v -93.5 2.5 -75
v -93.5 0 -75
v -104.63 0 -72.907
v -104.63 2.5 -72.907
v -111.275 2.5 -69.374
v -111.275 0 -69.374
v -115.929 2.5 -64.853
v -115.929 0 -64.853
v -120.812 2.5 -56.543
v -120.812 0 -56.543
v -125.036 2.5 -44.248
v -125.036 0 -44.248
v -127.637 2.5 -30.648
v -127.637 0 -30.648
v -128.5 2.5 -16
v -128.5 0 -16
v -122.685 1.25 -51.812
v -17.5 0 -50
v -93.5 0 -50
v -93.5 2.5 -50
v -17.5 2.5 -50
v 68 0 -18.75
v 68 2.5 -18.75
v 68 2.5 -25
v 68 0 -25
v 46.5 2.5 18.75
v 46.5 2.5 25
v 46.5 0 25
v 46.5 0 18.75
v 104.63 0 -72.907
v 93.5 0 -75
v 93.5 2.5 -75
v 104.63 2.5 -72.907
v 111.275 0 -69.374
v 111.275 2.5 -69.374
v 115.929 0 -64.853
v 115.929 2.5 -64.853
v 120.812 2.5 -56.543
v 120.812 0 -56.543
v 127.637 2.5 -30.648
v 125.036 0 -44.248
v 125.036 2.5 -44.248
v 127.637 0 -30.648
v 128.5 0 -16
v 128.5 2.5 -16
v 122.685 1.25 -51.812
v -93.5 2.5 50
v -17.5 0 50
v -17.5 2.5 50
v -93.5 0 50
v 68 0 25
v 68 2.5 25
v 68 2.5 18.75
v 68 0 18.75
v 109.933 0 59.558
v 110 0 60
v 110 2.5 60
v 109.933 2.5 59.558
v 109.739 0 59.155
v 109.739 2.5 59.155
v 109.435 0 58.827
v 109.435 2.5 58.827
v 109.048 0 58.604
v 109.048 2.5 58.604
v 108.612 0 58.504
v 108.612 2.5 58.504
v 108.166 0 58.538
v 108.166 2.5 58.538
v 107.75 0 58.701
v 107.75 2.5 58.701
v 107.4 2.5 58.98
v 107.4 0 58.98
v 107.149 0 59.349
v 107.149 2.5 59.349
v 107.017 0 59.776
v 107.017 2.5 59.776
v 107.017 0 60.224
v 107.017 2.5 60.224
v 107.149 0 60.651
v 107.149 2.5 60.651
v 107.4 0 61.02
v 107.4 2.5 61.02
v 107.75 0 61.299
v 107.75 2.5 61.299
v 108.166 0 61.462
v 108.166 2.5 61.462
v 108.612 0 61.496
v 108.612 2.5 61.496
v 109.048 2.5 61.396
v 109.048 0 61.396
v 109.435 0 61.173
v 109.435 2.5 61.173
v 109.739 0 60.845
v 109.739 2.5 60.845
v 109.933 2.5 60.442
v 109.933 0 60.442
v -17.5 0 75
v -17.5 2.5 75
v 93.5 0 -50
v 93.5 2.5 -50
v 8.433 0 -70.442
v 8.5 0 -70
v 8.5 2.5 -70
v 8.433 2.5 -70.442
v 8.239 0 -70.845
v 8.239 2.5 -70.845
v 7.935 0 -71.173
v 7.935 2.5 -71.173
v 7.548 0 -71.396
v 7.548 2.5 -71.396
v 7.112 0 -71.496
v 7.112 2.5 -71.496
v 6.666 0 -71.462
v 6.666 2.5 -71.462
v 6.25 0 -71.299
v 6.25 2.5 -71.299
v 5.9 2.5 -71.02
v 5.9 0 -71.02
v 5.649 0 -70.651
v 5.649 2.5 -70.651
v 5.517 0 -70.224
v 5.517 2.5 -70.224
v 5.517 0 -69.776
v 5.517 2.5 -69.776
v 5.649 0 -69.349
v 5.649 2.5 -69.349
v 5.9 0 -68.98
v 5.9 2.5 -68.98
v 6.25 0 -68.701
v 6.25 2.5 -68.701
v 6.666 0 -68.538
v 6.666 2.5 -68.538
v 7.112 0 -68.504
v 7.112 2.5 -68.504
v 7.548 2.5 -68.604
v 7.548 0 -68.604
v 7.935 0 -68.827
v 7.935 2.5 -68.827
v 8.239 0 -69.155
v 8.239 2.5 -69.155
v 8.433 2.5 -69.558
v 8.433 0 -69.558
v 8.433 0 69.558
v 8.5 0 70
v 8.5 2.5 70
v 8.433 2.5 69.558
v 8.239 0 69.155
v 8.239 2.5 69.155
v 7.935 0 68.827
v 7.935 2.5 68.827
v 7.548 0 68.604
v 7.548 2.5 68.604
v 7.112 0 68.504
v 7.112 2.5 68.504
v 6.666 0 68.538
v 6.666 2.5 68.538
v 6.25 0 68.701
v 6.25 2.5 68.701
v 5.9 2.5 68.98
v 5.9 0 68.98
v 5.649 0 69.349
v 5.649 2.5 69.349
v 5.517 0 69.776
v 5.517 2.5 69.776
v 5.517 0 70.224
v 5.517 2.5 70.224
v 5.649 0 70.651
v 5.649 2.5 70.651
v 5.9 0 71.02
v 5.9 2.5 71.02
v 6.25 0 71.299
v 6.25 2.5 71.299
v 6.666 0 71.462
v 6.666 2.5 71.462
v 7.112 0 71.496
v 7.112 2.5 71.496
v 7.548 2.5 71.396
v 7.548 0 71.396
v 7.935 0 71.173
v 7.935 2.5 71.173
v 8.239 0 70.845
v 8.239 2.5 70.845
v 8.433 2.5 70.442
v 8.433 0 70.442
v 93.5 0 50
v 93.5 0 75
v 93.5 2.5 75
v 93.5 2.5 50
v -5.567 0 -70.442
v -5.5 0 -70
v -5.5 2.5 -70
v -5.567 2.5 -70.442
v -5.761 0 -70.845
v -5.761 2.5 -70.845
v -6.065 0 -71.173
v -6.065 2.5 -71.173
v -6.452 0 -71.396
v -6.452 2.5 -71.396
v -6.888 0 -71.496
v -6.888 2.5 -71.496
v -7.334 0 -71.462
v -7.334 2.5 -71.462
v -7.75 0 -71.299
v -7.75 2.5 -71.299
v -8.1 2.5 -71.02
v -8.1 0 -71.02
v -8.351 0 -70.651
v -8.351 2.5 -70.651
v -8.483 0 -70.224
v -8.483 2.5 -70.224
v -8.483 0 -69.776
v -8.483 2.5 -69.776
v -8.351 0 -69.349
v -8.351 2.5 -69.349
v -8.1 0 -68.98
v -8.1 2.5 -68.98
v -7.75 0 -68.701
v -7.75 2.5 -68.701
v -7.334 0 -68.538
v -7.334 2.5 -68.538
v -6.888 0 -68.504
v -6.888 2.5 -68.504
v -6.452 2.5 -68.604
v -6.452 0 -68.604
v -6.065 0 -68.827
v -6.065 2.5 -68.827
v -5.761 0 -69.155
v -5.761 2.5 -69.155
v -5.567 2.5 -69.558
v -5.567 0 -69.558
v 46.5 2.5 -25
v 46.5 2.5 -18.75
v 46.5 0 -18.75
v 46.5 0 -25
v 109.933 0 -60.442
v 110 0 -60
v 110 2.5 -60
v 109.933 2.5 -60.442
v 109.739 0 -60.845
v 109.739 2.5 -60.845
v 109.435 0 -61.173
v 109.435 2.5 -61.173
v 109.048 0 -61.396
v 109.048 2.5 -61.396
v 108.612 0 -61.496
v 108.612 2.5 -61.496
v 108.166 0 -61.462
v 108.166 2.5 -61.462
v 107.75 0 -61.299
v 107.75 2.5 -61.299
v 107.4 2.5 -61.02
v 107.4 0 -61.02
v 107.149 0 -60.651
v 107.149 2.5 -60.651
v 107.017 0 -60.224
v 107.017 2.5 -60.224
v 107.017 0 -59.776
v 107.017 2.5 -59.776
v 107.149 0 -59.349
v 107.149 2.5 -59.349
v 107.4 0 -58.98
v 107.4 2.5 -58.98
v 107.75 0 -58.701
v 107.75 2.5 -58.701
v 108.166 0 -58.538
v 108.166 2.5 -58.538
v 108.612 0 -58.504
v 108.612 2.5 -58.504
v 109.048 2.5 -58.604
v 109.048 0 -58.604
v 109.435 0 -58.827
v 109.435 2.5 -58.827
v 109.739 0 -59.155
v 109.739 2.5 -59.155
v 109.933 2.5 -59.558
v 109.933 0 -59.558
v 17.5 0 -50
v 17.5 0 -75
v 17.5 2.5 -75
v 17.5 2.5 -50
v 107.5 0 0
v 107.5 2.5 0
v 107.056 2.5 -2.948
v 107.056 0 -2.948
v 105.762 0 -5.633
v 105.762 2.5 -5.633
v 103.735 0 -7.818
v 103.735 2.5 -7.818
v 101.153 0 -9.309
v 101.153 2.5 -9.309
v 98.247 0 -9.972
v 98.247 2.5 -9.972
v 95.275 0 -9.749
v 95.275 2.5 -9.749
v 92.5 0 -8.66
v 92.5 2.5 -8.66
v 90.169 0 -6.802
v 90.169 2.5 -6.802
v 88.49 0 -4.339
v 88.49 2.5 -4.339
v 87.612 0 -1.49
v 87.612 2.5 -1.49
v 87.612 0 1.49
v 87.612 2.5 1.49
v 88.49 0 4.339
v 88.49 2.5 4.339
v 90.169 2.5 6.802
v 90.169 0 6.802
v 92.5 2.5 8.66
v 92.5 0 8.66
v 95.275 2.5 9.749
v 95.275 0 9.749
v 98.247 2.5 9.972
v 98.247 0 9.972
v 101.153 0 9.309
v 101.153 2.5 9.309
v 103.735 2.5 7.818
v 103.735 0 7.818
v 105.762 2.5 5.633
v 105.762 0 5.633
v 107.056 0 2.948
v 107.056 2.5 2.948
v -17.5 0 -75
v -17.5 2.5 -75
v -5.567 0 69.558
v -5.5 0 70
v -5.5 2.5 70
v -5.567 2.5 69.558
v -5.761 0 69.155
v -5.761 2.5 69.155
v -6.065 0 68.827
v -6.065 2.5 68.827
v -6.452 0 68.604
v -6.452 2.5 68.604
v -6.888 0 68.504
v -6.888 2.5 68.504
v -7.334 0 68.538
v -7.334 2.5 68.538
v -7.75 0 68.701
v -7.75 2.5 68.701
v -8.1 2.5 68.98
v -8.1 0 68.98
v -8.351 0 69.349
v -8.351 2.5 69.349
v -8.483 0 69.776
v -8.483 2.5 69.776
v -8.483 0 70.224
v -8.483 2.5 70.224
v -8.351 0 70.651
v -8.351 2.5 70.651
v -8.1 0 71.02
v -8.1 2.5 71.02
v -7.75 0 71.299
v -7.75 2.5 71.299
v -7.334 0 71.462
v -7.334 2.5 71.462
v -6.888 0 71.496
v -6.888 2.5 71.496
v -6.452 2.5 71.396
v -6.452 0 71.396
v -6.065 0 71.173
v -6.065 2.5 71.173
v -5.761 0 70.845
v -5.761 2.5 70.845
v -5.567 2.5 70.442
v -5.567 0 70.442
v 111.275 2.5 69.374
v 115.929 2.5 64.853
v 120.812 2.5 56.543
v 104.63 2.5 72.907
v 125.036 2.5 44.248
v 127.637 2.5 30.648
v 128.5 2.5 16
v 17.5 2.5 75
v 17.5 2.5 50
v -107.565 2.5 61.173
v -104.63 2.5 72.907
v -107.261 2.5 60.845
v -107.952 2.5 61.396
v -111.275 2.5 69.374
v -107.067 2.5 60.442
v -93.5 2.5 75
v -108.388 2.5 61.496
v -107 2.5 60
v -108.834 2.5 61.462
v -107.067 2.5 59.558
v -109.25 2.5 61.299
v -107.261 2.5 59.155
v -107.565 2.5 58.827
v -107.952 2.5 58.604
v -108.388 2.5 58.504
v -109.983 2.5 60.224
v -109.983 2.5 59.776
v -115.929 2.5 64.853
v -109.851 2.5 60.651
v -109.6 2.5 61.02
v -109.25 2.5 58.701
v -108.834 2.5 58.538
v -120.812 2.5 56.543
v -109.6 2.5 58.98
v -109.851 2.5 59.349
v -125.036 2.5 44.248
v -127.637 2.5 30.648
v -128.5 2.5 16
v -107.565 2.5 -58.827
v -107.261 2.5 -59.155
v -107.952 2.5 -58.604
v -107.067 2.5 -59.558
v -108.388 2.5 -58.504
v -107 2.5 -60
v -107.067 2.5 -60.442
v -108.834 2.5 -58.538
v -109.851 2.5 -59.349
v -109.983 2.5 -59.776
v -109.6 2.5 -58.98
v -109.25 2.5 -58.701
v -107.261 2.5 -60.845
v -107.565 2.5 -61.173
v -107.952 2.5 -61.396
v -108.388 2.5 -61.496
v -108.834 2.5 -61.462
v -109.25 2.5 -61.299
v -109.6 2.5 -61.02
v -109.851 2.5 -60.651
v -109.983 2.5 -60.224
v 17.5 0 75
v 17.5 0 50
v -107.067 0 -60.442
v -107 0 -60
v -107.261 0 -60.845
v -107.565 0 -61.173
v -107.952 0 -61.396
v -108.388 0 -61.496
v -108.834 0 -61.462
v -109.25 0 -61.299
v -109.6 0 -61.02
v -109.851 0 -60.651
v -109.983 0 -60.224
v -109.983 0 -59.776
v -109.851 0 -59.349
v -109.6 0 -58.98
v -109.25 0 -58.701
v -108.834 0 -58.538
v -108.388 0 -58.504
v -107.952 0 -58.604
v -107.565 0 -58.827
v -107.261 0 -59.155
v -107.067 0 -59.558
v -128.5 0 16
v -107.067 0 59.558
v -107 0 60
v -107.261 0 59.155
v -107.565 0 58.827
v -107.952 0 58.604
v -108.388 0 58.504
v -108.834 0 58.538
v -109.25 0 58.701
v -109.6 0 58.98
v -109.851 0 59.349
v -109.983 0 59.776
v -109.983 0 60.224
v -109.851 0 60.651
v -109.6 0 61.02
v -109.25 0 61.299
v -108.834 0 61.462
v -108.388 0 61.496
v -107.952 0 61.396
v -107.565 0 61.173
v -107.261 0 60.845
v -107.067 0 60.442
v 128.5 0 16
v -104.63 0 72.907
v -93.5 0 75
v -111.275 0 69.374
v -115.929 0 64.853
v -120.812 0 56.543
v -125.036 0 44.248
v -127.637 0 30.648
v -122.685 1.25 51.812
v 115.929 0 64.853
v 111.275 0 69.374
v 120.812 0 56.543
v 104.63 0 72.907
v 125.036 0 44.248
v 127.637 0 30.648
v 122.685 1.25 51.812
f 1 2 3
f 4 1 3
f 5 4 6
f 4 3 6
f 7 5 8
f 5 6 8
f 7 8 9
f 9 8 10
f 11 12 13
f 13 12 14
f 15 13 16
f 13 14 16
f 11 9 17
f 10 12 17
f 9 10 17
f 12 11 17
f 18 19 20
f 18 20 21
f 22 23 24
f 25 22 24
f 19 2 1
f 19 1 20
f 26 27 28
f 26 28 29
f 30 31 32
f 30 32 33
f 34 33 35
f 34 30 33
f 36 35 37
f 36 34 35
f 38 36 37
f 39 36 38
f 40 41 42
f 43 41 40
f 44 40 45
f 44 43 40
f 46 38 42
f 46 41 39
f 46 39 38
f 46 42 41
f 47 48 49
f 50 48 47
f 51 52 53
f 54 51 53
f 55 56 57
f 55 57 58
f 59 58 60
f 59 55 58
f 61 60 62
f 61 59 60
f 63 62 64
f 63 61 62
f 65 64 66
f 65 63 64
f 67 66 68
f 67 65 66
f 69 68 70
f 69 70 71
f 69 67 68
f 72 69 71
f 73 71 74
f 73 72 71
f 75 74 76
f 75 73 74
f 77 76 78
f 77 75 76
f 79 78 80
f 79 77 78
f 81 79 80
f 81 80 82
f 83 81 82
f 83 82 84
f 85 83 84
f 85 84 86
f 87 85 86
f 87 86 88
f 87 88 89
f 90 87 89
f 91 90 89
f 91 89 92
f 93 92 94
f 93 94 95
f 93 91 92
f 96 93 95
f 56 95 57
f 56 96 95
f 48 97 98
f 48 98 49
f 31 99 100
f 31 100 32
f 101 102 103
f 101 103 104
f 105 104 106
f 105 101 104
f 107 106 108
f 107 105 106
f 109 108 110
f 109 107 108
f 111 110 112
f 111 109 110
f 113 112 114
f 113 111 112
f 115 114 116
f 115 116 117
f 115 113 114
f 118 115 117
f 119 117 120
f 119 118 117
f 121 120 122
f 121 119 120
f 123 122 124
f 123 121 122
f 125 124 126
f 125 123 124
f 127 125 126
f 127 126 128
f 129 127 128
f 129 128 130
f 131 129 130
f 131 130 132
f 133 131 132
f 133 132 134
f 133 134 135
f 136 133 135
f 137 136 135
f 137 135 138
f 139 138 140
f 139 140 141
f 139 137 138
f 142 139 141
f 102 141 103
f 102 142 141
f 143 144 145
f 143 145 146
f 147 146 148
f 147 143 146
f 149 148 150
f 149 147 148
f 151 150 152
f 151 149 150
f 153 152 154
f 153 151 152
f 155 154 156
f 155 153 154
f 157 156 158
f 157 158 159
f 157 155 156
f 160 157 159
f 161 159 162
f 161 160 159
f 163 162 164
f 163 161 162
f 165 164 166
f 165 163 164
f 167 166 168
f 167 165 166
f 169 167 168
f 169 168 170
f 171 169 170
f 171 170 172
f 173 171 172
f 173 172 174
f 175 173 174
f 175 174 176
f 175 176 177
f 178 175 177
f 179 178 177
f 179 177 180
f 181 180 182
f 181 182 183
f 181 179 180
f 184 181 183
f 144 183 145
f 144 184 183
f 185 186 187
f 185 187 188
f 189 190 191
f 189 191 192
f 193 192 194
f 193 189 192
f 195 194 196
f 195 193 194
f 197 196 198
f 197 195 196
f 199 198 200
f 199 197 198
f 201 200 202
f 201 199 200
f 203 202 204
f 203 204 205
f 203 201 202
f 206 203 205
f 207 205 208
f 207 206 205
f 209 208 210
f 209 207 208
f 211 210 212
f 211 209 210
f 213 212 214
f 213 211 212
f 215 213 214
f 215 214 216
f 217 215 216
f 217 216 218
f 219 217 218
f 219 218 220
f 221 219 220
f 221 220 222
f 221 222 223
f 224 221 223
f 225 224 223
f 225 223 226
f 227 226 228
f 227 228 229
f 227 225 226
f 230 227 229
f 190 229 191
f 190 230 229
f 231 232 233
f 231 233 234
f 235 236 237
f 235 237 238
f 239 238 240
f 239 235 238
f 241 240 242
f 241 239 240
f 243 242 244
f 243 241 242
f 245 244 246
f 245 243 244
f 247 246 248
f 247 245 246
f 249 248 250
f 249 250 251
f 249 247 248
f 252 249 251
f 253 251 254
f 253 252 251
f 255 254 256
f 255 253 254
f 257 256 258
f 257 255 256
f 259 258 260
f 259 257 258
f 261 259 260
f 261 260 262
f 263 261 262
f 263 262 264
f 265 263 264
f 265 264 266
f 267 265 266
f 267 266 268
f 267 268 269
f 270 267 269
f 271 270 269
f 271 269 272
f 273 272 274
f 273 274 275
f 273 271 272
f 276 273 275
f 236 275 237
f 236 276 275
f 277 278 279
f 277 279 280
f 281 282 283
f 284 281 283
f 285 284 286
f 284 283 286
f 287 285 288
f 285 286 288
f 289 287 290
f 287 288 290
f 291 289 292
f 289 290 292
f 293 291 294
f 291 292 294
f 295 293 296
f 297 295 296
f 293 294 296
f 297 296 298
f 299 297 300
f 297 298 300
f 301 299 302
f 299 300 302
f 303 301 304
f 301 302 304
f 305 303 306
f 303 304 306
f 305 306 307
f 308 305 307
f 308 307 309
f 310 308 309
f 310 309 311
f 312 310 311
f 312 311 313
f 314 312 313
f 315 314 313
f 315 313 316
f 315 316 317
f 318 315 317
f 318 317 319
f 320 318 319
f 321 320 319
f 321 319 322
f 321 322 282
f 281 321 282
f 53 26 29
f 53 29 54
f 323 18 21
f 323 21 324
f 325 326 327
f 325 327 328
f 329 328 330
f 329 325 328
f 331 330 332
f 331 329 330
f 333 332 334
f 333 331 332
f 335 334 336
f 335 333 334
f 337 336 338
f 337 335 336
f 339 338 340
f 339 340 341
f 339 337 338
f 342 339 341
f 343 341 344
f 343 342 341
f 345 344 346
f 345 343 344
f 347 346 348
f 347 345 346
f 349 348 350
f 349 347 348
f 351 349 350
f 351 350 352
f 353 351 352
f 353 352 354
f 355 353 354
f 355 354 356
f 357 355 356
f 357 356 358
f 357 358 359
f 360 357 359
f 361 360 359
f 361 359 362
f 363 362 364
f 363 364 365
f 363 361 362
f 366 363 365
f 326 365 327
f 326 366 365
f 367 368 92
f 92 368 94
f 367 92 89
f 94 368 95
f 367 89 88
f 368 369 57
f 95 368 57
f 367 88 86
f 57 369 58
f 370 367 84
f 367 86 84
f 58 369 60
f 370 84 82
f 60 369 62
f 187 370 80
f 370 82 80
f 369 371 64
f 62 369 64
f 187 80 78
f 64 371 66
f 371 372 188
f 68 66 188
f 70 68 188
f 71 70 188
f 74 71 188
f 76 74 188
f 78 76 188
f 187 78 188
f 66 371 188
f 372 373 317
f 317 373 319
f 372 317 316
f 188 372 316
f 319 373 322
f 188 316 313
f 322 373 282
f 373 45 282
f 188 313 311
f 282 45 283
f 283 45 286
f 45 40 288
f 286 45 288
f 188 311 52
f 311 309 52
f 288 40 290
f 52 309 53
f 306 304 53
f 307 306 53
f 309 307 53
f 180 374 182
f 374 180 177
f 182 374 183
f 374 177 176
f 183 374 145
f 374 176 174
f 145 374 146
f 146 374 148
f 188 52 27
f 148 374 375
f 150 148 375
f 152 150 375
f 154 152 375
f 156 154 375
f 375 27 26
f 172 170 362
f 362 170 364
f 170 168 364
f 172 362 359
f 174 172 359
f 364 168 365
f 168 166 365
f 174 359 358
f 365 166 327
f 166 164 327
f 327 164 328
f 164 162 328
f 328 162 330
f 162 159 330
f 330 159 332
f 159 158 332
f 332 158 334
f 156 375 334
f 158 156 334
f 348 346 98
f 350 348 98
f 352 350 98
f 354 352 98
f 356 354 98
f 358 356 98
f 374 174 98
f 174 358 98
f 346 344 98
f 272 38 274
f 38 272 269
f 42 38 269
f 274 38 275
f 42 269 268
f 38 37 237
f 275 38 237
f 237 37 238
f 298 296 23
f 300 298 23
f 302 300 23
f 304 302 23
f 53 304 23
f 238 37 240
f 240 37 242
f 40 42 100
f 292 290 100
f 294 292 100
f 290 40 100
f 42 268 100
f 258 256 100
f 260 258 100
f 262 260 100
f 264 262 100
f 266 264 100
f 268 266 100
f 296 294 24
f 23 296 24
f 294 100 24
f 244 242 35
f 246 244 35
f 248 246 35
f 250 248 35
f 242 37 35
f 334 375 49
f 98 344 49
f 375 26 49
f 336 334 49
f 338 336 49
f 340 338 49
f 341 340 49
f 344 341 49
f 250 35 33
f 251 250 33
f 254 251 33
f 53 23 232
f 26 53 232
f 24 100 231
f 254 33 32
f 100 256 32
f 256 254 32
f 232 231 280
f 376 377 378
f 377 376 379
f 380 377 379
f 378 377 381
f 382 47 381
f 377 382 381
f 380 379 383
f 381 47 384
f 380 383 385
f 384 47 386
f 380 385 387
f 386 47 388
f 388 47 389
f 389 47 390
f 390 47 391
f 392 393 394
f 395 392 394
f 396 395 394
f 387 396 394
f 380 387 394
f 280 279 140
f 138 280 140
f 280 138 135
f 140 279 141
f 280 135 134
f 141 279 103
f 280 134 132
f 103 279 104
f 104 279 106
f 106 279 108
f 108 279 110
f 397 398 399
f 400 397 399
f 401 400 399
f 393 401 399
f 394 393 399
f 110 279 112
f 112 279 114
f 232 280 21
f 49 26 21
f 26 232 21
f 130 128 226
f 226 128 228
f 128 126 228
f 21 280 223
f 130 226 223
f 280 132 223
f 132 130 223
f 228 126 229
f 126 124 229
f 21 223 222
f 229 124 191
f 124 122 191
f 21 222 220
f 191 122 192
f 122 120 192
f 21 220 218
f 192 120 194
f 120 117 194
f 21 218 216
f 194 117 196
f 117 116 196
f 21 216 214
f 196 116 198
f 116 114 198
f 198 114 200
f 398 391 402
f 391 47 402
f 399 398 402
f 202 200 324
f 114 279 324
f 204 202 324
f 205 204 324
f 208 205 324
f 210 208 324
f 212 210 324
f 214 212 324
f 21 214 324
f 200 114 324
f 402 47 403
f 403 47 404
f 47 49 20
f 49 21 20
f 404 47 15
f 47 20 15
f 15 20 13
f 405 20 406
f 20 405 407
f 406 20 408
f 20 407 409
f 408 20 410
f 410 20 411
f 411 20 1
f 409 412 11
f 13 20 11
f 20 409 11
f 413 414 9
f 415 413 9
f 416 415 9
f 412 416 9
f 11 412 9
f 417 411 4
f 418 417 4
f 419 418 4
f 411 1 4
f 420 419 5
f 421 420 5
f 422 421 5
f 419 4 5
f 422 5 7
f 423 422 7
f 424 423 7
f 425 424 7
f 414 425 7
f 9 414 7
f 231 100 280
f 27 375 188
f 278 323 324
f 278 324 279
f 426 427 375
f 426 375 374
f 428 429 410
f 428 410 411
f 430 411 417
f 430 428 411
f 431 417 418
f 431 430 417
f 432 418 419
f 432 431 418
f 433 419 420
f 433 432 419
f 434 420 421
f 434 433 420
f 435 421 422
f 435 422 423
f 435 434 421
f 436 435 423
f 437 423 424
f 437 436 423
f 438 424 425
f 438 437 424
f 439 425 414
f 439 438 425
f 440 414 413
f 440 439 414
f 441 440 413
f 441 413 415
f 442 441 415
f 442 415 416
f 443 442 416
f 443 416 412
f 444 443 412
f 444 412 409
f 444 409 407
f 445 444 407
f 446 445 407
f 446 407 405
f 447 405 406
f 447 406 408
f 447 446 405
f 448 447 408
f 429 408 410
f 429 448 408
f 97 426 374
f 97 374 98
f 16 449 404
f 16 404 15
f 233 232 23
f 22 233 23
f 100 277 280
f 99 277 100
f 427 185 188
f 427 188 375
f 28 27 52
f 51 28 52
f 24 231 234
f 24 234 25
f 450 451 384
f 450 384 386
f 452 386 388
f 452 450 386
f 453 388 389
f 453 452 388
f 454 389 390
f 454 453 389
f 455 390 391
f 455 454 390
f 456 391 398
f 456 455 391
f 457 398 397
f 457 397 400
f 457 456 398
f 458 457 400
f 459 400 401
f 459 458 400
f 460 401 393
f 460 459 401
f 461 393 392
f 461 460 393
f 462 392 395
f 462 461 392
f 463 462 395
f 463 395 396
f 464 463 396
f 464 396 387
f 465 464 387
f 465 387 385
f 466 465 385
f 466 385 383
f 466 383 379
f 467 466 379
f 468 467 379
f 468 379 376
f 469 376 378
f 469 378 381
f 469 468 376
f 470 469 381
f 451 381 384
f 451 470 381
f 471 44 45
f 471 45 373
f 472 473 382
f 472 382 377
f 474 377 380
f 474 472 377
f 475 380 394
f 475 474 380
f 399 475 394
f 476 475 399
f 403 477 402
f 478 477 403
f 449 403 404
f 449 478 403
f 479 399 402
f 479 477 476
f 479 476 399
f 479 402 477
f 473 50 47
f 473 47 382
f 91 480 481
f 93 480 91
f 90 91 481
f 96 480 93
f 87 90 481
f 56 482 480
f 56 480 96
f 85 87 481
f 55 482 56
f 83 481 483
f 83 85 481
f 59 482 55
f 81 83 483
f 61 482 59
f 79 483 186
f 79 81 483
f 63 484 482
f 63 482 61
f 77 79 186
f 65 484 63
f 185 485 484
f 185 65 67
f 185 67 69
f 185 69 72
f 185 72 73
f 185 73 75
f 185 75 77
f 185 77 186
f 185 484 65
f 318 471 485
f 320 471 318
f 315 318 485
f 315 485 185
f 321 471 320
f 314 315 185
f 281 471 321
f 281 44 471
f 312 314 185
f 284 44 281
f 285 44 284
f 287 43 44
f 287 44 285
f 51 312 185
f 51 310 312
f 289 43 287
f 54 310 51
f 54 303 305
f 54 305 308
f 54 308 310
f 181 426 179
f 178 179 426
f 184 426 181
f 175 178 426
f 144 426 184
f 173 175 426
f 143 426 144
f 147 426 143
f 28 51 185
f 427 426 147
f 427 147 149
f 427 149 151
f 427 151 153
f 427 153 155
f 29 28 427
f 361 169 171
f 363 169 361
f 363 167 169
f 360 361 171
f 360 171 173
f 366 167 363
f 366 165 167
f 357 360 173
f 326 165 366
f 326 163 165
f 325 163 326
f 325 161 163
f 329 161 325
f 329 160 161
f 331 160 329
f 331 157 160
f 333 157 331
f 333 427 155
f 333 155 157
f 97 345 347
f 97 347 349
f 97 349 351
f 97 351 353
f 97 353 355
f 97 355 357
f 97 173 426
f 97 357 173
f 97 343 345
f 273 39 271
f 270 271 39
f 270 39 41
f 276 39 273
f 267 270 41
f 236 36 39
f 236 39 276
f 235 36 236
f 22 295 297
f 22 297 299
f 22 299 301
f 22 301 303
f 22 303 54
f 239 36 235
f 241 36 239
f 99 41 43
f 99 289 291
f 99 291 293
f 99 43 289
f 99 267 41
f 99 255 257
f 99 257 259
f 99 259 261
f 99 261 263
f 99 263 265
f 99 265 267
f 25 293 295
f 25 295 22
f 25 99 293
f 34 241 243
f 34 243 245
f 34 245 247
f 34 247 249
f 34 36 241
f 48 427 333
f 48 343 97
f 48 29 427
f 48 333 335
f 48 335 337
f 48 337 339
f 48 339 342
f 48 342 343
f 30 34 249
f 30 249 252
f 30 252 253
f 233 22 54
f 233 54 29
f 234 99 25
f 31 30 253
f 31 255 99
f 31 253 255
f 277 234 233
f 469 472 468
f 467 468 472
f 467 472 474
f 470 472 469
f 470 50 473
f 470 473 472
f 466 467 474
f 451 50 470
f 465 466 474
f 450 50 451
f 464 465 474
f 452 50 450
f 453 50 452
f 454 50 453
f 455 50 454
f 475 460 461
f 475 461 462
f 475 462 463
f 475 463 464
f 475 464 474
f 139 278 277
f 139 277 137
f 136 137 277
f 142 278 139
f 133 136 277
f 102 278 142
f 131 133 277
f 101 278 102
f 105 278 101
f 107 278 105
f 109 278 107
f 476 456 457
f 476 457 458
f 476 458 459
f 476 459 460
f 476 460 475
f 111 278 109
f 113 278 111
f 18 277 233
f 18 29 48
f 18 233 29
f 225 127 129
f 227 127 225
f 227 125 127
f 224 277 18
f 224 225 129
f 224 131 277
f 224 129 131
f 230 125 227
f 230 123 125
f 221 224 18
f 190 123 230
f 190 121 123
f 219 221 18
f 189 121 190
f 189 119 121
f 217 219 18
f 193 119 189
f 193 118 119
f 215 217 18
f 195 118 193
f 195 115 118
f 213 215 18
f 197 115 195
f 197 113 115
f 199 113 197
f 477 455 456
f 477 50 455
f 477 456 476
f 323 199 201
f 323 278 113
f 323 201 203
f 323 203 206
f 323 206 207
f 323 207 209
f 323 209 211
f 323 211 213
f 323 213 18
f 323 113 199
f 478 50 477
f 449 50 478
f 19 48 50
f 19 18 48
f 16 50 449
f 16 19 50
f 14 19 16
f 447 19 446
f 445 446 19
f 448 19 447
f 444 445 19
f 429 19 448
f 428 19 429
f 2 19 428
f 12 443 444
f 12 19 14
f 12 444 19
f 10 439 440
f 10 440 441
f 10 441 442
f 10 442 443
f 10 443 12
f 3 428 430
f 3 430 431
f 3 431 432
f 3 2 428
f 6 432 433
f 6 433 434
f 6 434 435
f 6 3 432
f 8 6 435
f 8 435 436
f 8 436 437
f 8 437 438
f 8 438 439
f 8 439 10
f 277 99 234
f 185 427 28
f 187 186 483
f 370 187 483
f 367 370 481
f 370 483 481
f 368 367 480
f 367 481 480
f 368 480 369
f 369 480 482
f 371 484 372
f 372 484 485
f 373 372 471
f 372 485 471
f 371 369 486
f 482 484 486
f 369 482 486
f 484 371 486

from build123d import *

# Parameters (mm, degrees)
SKETCH_1_R          = 1.5
EXTRUDE_1_DEPTH     = 2.5
SKETCH_2_W          = 21.5
SKETCH_2_H          = 6.25
CUT_EXTRUDE_1_DEPTH = 3.5000001
SKETCH_3_R          = 10
CUT_EXTRUDE_2_DEPTH = 3.5000001


with BuildPart() as part:
    # 草图1 → 凸台-拉伸1 (new body)
    with BuildSketch(Plane(origin=(0, 0, 0), x_dir=(1, 0, 0), z_dir=(0, 1, 0))):
        with BuildLine():
            Line((-128.499999999, -16), (-128.499999999, 16))
            add(Edge.make_bspline(
                [(-93.499999999, 75.000000013), (-111.61760277, 74.009879458), (-123.133759969, 57.24109691), (-128.499999999, 30.447414919), (-128.499999999, 16)],
                knots=[0, 0, 0, 0, 0.426208918, 0.752892545, 0.752892545, 0.752892545, 0.752892545], degree=3))
            Line((-93.499999999, 75.000000013), (-93.499999999, 50))
            Line((-93.499999999, 50), (-17.5, 50))
            Line((-17.5, 50), (-17.5, 75.000000013))
            Line((-17.5, 75.000000013), (17.5, 75.000000013))
            Line((17.5, 75.000000013), (17.5, 50))
            Line((17.5, 50), (93.499999999, 50))
            Line((93.499999999, 50), (93.499999999, 75.000000013))
            add(Edge.make_bspline(
                [(93.499999999, 75.000000013), (111.61760277, 74.009879458), (123.133759969, 57.24109691), (128.499999999, 30.447414919), (128.499999999, 16)],
                knots=[0, 0, 0, 0, 0.426208918, 0.752892545, 0.752892545, 0.752892545, 0.752892545], degree=3))
            Line((128.499999999, 16), (128.499999999, -16))
            add(Edge.make_bspline(
                [(93.499999999, -75.000000013), (111.61760277, -74.009879458), (123.133759969, -57.24109691), (128.499999999, -30.447414919), (128.499999999, -16)],
                knots=[0, 0, 0, 0, 0.426208918, 0.752892545, 0.752892545, 0.752892545, 0.752892545], degree=3))
            Line((93.499999999, -75.000000013), (93.499999999, -50))
            Line((93.499999999, -50), (17.5, -50))
            Line((17.5, -50), (17.5, -75.000000013))
            Line((17.5, -75.000000013), (-17.5, -75.000000013))
            Line((-17.5, -75.000000013), (-17.5, -50))
            Line((-17.5, -50), (-93.499999999, -50))
            Line((-93.499999999, -50), (-93.499999999, -75.000000013))
            add(Edge.make_bspline(
                [(-93.499999999, -75.000000013), (-111.61760277, -74.009879458), (-123.133759969, -57.24109691), (-128.499999999, -30.447414919), (-128.499999999, -16)],
                knots=[0, 0, 0, 0, 0.426208918, 0.752892545, 0.752892545, 0.752892545, 0.752892545], degree=3))
        make_face()
        with Locations((-108.499999999, 60)):
            Circle(SKETCH_1_R, mode=Mode.SUBTRACT)
        with Locations((-108.499999999, -60)):
            Circle(SKETCH_1_R, mode=Mode.SUBTRACT)
        with Locations((108.499999999, -60)):
            Circle(SKETCH_1_R, mode=Mode.SUBTRACT)
        with Locations((108.499999999, 60)):
            Circle(SKETCH_1_R, mode=Mode.SUBTRACT)
        with Locations((7, 70.000000013)):
            Circle(SKETCH_1_R, mode=Mode.SUBTRACT)
        with Locations((-7, 70.000000013)):
            Circle(SKETCH_1_R, mode=Mode.SUBTRACT)
        with Locations((7, -70.000000013)):
            Circle(SKETCH_1_R, mode=Mode.SUBTRACT)
        with Locations((-7, -70.000000013)):
            Circle(SKETCH_1_R, mode=Mode.SUBTRACT)
    extrude(amount=EXTRUDE_1_DEPTH)

    # 草图2 → 切除-拉伸1 (cut, through all)
    with BuildSketch(Plane(origin=(0, 2.5, 0), x_dir=(1, 0, 0), z_dir=(0, 1, 0))):
        with Locations((57.25, 21.875)):
            Rectangle(SKETCH_2_W, SKETCH_2_H)
        with Locations((57.25, -21.875)):
            Rectangle(SKETCH_2_W, SKETCH_2_H)
    extrude(amount=-CUT_EXTRUDE_1_DEPTH, mode=Mode.SUBTRACT)

    # 草图3 → 切除-拉伸2 (cut, through all)
    with BuildSketch(Plane(origin=(0, 2.5, 0), x_dir=(1, 0, 0), z_dir=(0, 1, 0))):
        with Locations((97.499999999, 0)):
            Circle(SKETCH_3_R)
    extrude(amount=-CUT_EXTRUDE_2_DEPTH, mode=Mode.SUBTRACT)


solid = part.part
